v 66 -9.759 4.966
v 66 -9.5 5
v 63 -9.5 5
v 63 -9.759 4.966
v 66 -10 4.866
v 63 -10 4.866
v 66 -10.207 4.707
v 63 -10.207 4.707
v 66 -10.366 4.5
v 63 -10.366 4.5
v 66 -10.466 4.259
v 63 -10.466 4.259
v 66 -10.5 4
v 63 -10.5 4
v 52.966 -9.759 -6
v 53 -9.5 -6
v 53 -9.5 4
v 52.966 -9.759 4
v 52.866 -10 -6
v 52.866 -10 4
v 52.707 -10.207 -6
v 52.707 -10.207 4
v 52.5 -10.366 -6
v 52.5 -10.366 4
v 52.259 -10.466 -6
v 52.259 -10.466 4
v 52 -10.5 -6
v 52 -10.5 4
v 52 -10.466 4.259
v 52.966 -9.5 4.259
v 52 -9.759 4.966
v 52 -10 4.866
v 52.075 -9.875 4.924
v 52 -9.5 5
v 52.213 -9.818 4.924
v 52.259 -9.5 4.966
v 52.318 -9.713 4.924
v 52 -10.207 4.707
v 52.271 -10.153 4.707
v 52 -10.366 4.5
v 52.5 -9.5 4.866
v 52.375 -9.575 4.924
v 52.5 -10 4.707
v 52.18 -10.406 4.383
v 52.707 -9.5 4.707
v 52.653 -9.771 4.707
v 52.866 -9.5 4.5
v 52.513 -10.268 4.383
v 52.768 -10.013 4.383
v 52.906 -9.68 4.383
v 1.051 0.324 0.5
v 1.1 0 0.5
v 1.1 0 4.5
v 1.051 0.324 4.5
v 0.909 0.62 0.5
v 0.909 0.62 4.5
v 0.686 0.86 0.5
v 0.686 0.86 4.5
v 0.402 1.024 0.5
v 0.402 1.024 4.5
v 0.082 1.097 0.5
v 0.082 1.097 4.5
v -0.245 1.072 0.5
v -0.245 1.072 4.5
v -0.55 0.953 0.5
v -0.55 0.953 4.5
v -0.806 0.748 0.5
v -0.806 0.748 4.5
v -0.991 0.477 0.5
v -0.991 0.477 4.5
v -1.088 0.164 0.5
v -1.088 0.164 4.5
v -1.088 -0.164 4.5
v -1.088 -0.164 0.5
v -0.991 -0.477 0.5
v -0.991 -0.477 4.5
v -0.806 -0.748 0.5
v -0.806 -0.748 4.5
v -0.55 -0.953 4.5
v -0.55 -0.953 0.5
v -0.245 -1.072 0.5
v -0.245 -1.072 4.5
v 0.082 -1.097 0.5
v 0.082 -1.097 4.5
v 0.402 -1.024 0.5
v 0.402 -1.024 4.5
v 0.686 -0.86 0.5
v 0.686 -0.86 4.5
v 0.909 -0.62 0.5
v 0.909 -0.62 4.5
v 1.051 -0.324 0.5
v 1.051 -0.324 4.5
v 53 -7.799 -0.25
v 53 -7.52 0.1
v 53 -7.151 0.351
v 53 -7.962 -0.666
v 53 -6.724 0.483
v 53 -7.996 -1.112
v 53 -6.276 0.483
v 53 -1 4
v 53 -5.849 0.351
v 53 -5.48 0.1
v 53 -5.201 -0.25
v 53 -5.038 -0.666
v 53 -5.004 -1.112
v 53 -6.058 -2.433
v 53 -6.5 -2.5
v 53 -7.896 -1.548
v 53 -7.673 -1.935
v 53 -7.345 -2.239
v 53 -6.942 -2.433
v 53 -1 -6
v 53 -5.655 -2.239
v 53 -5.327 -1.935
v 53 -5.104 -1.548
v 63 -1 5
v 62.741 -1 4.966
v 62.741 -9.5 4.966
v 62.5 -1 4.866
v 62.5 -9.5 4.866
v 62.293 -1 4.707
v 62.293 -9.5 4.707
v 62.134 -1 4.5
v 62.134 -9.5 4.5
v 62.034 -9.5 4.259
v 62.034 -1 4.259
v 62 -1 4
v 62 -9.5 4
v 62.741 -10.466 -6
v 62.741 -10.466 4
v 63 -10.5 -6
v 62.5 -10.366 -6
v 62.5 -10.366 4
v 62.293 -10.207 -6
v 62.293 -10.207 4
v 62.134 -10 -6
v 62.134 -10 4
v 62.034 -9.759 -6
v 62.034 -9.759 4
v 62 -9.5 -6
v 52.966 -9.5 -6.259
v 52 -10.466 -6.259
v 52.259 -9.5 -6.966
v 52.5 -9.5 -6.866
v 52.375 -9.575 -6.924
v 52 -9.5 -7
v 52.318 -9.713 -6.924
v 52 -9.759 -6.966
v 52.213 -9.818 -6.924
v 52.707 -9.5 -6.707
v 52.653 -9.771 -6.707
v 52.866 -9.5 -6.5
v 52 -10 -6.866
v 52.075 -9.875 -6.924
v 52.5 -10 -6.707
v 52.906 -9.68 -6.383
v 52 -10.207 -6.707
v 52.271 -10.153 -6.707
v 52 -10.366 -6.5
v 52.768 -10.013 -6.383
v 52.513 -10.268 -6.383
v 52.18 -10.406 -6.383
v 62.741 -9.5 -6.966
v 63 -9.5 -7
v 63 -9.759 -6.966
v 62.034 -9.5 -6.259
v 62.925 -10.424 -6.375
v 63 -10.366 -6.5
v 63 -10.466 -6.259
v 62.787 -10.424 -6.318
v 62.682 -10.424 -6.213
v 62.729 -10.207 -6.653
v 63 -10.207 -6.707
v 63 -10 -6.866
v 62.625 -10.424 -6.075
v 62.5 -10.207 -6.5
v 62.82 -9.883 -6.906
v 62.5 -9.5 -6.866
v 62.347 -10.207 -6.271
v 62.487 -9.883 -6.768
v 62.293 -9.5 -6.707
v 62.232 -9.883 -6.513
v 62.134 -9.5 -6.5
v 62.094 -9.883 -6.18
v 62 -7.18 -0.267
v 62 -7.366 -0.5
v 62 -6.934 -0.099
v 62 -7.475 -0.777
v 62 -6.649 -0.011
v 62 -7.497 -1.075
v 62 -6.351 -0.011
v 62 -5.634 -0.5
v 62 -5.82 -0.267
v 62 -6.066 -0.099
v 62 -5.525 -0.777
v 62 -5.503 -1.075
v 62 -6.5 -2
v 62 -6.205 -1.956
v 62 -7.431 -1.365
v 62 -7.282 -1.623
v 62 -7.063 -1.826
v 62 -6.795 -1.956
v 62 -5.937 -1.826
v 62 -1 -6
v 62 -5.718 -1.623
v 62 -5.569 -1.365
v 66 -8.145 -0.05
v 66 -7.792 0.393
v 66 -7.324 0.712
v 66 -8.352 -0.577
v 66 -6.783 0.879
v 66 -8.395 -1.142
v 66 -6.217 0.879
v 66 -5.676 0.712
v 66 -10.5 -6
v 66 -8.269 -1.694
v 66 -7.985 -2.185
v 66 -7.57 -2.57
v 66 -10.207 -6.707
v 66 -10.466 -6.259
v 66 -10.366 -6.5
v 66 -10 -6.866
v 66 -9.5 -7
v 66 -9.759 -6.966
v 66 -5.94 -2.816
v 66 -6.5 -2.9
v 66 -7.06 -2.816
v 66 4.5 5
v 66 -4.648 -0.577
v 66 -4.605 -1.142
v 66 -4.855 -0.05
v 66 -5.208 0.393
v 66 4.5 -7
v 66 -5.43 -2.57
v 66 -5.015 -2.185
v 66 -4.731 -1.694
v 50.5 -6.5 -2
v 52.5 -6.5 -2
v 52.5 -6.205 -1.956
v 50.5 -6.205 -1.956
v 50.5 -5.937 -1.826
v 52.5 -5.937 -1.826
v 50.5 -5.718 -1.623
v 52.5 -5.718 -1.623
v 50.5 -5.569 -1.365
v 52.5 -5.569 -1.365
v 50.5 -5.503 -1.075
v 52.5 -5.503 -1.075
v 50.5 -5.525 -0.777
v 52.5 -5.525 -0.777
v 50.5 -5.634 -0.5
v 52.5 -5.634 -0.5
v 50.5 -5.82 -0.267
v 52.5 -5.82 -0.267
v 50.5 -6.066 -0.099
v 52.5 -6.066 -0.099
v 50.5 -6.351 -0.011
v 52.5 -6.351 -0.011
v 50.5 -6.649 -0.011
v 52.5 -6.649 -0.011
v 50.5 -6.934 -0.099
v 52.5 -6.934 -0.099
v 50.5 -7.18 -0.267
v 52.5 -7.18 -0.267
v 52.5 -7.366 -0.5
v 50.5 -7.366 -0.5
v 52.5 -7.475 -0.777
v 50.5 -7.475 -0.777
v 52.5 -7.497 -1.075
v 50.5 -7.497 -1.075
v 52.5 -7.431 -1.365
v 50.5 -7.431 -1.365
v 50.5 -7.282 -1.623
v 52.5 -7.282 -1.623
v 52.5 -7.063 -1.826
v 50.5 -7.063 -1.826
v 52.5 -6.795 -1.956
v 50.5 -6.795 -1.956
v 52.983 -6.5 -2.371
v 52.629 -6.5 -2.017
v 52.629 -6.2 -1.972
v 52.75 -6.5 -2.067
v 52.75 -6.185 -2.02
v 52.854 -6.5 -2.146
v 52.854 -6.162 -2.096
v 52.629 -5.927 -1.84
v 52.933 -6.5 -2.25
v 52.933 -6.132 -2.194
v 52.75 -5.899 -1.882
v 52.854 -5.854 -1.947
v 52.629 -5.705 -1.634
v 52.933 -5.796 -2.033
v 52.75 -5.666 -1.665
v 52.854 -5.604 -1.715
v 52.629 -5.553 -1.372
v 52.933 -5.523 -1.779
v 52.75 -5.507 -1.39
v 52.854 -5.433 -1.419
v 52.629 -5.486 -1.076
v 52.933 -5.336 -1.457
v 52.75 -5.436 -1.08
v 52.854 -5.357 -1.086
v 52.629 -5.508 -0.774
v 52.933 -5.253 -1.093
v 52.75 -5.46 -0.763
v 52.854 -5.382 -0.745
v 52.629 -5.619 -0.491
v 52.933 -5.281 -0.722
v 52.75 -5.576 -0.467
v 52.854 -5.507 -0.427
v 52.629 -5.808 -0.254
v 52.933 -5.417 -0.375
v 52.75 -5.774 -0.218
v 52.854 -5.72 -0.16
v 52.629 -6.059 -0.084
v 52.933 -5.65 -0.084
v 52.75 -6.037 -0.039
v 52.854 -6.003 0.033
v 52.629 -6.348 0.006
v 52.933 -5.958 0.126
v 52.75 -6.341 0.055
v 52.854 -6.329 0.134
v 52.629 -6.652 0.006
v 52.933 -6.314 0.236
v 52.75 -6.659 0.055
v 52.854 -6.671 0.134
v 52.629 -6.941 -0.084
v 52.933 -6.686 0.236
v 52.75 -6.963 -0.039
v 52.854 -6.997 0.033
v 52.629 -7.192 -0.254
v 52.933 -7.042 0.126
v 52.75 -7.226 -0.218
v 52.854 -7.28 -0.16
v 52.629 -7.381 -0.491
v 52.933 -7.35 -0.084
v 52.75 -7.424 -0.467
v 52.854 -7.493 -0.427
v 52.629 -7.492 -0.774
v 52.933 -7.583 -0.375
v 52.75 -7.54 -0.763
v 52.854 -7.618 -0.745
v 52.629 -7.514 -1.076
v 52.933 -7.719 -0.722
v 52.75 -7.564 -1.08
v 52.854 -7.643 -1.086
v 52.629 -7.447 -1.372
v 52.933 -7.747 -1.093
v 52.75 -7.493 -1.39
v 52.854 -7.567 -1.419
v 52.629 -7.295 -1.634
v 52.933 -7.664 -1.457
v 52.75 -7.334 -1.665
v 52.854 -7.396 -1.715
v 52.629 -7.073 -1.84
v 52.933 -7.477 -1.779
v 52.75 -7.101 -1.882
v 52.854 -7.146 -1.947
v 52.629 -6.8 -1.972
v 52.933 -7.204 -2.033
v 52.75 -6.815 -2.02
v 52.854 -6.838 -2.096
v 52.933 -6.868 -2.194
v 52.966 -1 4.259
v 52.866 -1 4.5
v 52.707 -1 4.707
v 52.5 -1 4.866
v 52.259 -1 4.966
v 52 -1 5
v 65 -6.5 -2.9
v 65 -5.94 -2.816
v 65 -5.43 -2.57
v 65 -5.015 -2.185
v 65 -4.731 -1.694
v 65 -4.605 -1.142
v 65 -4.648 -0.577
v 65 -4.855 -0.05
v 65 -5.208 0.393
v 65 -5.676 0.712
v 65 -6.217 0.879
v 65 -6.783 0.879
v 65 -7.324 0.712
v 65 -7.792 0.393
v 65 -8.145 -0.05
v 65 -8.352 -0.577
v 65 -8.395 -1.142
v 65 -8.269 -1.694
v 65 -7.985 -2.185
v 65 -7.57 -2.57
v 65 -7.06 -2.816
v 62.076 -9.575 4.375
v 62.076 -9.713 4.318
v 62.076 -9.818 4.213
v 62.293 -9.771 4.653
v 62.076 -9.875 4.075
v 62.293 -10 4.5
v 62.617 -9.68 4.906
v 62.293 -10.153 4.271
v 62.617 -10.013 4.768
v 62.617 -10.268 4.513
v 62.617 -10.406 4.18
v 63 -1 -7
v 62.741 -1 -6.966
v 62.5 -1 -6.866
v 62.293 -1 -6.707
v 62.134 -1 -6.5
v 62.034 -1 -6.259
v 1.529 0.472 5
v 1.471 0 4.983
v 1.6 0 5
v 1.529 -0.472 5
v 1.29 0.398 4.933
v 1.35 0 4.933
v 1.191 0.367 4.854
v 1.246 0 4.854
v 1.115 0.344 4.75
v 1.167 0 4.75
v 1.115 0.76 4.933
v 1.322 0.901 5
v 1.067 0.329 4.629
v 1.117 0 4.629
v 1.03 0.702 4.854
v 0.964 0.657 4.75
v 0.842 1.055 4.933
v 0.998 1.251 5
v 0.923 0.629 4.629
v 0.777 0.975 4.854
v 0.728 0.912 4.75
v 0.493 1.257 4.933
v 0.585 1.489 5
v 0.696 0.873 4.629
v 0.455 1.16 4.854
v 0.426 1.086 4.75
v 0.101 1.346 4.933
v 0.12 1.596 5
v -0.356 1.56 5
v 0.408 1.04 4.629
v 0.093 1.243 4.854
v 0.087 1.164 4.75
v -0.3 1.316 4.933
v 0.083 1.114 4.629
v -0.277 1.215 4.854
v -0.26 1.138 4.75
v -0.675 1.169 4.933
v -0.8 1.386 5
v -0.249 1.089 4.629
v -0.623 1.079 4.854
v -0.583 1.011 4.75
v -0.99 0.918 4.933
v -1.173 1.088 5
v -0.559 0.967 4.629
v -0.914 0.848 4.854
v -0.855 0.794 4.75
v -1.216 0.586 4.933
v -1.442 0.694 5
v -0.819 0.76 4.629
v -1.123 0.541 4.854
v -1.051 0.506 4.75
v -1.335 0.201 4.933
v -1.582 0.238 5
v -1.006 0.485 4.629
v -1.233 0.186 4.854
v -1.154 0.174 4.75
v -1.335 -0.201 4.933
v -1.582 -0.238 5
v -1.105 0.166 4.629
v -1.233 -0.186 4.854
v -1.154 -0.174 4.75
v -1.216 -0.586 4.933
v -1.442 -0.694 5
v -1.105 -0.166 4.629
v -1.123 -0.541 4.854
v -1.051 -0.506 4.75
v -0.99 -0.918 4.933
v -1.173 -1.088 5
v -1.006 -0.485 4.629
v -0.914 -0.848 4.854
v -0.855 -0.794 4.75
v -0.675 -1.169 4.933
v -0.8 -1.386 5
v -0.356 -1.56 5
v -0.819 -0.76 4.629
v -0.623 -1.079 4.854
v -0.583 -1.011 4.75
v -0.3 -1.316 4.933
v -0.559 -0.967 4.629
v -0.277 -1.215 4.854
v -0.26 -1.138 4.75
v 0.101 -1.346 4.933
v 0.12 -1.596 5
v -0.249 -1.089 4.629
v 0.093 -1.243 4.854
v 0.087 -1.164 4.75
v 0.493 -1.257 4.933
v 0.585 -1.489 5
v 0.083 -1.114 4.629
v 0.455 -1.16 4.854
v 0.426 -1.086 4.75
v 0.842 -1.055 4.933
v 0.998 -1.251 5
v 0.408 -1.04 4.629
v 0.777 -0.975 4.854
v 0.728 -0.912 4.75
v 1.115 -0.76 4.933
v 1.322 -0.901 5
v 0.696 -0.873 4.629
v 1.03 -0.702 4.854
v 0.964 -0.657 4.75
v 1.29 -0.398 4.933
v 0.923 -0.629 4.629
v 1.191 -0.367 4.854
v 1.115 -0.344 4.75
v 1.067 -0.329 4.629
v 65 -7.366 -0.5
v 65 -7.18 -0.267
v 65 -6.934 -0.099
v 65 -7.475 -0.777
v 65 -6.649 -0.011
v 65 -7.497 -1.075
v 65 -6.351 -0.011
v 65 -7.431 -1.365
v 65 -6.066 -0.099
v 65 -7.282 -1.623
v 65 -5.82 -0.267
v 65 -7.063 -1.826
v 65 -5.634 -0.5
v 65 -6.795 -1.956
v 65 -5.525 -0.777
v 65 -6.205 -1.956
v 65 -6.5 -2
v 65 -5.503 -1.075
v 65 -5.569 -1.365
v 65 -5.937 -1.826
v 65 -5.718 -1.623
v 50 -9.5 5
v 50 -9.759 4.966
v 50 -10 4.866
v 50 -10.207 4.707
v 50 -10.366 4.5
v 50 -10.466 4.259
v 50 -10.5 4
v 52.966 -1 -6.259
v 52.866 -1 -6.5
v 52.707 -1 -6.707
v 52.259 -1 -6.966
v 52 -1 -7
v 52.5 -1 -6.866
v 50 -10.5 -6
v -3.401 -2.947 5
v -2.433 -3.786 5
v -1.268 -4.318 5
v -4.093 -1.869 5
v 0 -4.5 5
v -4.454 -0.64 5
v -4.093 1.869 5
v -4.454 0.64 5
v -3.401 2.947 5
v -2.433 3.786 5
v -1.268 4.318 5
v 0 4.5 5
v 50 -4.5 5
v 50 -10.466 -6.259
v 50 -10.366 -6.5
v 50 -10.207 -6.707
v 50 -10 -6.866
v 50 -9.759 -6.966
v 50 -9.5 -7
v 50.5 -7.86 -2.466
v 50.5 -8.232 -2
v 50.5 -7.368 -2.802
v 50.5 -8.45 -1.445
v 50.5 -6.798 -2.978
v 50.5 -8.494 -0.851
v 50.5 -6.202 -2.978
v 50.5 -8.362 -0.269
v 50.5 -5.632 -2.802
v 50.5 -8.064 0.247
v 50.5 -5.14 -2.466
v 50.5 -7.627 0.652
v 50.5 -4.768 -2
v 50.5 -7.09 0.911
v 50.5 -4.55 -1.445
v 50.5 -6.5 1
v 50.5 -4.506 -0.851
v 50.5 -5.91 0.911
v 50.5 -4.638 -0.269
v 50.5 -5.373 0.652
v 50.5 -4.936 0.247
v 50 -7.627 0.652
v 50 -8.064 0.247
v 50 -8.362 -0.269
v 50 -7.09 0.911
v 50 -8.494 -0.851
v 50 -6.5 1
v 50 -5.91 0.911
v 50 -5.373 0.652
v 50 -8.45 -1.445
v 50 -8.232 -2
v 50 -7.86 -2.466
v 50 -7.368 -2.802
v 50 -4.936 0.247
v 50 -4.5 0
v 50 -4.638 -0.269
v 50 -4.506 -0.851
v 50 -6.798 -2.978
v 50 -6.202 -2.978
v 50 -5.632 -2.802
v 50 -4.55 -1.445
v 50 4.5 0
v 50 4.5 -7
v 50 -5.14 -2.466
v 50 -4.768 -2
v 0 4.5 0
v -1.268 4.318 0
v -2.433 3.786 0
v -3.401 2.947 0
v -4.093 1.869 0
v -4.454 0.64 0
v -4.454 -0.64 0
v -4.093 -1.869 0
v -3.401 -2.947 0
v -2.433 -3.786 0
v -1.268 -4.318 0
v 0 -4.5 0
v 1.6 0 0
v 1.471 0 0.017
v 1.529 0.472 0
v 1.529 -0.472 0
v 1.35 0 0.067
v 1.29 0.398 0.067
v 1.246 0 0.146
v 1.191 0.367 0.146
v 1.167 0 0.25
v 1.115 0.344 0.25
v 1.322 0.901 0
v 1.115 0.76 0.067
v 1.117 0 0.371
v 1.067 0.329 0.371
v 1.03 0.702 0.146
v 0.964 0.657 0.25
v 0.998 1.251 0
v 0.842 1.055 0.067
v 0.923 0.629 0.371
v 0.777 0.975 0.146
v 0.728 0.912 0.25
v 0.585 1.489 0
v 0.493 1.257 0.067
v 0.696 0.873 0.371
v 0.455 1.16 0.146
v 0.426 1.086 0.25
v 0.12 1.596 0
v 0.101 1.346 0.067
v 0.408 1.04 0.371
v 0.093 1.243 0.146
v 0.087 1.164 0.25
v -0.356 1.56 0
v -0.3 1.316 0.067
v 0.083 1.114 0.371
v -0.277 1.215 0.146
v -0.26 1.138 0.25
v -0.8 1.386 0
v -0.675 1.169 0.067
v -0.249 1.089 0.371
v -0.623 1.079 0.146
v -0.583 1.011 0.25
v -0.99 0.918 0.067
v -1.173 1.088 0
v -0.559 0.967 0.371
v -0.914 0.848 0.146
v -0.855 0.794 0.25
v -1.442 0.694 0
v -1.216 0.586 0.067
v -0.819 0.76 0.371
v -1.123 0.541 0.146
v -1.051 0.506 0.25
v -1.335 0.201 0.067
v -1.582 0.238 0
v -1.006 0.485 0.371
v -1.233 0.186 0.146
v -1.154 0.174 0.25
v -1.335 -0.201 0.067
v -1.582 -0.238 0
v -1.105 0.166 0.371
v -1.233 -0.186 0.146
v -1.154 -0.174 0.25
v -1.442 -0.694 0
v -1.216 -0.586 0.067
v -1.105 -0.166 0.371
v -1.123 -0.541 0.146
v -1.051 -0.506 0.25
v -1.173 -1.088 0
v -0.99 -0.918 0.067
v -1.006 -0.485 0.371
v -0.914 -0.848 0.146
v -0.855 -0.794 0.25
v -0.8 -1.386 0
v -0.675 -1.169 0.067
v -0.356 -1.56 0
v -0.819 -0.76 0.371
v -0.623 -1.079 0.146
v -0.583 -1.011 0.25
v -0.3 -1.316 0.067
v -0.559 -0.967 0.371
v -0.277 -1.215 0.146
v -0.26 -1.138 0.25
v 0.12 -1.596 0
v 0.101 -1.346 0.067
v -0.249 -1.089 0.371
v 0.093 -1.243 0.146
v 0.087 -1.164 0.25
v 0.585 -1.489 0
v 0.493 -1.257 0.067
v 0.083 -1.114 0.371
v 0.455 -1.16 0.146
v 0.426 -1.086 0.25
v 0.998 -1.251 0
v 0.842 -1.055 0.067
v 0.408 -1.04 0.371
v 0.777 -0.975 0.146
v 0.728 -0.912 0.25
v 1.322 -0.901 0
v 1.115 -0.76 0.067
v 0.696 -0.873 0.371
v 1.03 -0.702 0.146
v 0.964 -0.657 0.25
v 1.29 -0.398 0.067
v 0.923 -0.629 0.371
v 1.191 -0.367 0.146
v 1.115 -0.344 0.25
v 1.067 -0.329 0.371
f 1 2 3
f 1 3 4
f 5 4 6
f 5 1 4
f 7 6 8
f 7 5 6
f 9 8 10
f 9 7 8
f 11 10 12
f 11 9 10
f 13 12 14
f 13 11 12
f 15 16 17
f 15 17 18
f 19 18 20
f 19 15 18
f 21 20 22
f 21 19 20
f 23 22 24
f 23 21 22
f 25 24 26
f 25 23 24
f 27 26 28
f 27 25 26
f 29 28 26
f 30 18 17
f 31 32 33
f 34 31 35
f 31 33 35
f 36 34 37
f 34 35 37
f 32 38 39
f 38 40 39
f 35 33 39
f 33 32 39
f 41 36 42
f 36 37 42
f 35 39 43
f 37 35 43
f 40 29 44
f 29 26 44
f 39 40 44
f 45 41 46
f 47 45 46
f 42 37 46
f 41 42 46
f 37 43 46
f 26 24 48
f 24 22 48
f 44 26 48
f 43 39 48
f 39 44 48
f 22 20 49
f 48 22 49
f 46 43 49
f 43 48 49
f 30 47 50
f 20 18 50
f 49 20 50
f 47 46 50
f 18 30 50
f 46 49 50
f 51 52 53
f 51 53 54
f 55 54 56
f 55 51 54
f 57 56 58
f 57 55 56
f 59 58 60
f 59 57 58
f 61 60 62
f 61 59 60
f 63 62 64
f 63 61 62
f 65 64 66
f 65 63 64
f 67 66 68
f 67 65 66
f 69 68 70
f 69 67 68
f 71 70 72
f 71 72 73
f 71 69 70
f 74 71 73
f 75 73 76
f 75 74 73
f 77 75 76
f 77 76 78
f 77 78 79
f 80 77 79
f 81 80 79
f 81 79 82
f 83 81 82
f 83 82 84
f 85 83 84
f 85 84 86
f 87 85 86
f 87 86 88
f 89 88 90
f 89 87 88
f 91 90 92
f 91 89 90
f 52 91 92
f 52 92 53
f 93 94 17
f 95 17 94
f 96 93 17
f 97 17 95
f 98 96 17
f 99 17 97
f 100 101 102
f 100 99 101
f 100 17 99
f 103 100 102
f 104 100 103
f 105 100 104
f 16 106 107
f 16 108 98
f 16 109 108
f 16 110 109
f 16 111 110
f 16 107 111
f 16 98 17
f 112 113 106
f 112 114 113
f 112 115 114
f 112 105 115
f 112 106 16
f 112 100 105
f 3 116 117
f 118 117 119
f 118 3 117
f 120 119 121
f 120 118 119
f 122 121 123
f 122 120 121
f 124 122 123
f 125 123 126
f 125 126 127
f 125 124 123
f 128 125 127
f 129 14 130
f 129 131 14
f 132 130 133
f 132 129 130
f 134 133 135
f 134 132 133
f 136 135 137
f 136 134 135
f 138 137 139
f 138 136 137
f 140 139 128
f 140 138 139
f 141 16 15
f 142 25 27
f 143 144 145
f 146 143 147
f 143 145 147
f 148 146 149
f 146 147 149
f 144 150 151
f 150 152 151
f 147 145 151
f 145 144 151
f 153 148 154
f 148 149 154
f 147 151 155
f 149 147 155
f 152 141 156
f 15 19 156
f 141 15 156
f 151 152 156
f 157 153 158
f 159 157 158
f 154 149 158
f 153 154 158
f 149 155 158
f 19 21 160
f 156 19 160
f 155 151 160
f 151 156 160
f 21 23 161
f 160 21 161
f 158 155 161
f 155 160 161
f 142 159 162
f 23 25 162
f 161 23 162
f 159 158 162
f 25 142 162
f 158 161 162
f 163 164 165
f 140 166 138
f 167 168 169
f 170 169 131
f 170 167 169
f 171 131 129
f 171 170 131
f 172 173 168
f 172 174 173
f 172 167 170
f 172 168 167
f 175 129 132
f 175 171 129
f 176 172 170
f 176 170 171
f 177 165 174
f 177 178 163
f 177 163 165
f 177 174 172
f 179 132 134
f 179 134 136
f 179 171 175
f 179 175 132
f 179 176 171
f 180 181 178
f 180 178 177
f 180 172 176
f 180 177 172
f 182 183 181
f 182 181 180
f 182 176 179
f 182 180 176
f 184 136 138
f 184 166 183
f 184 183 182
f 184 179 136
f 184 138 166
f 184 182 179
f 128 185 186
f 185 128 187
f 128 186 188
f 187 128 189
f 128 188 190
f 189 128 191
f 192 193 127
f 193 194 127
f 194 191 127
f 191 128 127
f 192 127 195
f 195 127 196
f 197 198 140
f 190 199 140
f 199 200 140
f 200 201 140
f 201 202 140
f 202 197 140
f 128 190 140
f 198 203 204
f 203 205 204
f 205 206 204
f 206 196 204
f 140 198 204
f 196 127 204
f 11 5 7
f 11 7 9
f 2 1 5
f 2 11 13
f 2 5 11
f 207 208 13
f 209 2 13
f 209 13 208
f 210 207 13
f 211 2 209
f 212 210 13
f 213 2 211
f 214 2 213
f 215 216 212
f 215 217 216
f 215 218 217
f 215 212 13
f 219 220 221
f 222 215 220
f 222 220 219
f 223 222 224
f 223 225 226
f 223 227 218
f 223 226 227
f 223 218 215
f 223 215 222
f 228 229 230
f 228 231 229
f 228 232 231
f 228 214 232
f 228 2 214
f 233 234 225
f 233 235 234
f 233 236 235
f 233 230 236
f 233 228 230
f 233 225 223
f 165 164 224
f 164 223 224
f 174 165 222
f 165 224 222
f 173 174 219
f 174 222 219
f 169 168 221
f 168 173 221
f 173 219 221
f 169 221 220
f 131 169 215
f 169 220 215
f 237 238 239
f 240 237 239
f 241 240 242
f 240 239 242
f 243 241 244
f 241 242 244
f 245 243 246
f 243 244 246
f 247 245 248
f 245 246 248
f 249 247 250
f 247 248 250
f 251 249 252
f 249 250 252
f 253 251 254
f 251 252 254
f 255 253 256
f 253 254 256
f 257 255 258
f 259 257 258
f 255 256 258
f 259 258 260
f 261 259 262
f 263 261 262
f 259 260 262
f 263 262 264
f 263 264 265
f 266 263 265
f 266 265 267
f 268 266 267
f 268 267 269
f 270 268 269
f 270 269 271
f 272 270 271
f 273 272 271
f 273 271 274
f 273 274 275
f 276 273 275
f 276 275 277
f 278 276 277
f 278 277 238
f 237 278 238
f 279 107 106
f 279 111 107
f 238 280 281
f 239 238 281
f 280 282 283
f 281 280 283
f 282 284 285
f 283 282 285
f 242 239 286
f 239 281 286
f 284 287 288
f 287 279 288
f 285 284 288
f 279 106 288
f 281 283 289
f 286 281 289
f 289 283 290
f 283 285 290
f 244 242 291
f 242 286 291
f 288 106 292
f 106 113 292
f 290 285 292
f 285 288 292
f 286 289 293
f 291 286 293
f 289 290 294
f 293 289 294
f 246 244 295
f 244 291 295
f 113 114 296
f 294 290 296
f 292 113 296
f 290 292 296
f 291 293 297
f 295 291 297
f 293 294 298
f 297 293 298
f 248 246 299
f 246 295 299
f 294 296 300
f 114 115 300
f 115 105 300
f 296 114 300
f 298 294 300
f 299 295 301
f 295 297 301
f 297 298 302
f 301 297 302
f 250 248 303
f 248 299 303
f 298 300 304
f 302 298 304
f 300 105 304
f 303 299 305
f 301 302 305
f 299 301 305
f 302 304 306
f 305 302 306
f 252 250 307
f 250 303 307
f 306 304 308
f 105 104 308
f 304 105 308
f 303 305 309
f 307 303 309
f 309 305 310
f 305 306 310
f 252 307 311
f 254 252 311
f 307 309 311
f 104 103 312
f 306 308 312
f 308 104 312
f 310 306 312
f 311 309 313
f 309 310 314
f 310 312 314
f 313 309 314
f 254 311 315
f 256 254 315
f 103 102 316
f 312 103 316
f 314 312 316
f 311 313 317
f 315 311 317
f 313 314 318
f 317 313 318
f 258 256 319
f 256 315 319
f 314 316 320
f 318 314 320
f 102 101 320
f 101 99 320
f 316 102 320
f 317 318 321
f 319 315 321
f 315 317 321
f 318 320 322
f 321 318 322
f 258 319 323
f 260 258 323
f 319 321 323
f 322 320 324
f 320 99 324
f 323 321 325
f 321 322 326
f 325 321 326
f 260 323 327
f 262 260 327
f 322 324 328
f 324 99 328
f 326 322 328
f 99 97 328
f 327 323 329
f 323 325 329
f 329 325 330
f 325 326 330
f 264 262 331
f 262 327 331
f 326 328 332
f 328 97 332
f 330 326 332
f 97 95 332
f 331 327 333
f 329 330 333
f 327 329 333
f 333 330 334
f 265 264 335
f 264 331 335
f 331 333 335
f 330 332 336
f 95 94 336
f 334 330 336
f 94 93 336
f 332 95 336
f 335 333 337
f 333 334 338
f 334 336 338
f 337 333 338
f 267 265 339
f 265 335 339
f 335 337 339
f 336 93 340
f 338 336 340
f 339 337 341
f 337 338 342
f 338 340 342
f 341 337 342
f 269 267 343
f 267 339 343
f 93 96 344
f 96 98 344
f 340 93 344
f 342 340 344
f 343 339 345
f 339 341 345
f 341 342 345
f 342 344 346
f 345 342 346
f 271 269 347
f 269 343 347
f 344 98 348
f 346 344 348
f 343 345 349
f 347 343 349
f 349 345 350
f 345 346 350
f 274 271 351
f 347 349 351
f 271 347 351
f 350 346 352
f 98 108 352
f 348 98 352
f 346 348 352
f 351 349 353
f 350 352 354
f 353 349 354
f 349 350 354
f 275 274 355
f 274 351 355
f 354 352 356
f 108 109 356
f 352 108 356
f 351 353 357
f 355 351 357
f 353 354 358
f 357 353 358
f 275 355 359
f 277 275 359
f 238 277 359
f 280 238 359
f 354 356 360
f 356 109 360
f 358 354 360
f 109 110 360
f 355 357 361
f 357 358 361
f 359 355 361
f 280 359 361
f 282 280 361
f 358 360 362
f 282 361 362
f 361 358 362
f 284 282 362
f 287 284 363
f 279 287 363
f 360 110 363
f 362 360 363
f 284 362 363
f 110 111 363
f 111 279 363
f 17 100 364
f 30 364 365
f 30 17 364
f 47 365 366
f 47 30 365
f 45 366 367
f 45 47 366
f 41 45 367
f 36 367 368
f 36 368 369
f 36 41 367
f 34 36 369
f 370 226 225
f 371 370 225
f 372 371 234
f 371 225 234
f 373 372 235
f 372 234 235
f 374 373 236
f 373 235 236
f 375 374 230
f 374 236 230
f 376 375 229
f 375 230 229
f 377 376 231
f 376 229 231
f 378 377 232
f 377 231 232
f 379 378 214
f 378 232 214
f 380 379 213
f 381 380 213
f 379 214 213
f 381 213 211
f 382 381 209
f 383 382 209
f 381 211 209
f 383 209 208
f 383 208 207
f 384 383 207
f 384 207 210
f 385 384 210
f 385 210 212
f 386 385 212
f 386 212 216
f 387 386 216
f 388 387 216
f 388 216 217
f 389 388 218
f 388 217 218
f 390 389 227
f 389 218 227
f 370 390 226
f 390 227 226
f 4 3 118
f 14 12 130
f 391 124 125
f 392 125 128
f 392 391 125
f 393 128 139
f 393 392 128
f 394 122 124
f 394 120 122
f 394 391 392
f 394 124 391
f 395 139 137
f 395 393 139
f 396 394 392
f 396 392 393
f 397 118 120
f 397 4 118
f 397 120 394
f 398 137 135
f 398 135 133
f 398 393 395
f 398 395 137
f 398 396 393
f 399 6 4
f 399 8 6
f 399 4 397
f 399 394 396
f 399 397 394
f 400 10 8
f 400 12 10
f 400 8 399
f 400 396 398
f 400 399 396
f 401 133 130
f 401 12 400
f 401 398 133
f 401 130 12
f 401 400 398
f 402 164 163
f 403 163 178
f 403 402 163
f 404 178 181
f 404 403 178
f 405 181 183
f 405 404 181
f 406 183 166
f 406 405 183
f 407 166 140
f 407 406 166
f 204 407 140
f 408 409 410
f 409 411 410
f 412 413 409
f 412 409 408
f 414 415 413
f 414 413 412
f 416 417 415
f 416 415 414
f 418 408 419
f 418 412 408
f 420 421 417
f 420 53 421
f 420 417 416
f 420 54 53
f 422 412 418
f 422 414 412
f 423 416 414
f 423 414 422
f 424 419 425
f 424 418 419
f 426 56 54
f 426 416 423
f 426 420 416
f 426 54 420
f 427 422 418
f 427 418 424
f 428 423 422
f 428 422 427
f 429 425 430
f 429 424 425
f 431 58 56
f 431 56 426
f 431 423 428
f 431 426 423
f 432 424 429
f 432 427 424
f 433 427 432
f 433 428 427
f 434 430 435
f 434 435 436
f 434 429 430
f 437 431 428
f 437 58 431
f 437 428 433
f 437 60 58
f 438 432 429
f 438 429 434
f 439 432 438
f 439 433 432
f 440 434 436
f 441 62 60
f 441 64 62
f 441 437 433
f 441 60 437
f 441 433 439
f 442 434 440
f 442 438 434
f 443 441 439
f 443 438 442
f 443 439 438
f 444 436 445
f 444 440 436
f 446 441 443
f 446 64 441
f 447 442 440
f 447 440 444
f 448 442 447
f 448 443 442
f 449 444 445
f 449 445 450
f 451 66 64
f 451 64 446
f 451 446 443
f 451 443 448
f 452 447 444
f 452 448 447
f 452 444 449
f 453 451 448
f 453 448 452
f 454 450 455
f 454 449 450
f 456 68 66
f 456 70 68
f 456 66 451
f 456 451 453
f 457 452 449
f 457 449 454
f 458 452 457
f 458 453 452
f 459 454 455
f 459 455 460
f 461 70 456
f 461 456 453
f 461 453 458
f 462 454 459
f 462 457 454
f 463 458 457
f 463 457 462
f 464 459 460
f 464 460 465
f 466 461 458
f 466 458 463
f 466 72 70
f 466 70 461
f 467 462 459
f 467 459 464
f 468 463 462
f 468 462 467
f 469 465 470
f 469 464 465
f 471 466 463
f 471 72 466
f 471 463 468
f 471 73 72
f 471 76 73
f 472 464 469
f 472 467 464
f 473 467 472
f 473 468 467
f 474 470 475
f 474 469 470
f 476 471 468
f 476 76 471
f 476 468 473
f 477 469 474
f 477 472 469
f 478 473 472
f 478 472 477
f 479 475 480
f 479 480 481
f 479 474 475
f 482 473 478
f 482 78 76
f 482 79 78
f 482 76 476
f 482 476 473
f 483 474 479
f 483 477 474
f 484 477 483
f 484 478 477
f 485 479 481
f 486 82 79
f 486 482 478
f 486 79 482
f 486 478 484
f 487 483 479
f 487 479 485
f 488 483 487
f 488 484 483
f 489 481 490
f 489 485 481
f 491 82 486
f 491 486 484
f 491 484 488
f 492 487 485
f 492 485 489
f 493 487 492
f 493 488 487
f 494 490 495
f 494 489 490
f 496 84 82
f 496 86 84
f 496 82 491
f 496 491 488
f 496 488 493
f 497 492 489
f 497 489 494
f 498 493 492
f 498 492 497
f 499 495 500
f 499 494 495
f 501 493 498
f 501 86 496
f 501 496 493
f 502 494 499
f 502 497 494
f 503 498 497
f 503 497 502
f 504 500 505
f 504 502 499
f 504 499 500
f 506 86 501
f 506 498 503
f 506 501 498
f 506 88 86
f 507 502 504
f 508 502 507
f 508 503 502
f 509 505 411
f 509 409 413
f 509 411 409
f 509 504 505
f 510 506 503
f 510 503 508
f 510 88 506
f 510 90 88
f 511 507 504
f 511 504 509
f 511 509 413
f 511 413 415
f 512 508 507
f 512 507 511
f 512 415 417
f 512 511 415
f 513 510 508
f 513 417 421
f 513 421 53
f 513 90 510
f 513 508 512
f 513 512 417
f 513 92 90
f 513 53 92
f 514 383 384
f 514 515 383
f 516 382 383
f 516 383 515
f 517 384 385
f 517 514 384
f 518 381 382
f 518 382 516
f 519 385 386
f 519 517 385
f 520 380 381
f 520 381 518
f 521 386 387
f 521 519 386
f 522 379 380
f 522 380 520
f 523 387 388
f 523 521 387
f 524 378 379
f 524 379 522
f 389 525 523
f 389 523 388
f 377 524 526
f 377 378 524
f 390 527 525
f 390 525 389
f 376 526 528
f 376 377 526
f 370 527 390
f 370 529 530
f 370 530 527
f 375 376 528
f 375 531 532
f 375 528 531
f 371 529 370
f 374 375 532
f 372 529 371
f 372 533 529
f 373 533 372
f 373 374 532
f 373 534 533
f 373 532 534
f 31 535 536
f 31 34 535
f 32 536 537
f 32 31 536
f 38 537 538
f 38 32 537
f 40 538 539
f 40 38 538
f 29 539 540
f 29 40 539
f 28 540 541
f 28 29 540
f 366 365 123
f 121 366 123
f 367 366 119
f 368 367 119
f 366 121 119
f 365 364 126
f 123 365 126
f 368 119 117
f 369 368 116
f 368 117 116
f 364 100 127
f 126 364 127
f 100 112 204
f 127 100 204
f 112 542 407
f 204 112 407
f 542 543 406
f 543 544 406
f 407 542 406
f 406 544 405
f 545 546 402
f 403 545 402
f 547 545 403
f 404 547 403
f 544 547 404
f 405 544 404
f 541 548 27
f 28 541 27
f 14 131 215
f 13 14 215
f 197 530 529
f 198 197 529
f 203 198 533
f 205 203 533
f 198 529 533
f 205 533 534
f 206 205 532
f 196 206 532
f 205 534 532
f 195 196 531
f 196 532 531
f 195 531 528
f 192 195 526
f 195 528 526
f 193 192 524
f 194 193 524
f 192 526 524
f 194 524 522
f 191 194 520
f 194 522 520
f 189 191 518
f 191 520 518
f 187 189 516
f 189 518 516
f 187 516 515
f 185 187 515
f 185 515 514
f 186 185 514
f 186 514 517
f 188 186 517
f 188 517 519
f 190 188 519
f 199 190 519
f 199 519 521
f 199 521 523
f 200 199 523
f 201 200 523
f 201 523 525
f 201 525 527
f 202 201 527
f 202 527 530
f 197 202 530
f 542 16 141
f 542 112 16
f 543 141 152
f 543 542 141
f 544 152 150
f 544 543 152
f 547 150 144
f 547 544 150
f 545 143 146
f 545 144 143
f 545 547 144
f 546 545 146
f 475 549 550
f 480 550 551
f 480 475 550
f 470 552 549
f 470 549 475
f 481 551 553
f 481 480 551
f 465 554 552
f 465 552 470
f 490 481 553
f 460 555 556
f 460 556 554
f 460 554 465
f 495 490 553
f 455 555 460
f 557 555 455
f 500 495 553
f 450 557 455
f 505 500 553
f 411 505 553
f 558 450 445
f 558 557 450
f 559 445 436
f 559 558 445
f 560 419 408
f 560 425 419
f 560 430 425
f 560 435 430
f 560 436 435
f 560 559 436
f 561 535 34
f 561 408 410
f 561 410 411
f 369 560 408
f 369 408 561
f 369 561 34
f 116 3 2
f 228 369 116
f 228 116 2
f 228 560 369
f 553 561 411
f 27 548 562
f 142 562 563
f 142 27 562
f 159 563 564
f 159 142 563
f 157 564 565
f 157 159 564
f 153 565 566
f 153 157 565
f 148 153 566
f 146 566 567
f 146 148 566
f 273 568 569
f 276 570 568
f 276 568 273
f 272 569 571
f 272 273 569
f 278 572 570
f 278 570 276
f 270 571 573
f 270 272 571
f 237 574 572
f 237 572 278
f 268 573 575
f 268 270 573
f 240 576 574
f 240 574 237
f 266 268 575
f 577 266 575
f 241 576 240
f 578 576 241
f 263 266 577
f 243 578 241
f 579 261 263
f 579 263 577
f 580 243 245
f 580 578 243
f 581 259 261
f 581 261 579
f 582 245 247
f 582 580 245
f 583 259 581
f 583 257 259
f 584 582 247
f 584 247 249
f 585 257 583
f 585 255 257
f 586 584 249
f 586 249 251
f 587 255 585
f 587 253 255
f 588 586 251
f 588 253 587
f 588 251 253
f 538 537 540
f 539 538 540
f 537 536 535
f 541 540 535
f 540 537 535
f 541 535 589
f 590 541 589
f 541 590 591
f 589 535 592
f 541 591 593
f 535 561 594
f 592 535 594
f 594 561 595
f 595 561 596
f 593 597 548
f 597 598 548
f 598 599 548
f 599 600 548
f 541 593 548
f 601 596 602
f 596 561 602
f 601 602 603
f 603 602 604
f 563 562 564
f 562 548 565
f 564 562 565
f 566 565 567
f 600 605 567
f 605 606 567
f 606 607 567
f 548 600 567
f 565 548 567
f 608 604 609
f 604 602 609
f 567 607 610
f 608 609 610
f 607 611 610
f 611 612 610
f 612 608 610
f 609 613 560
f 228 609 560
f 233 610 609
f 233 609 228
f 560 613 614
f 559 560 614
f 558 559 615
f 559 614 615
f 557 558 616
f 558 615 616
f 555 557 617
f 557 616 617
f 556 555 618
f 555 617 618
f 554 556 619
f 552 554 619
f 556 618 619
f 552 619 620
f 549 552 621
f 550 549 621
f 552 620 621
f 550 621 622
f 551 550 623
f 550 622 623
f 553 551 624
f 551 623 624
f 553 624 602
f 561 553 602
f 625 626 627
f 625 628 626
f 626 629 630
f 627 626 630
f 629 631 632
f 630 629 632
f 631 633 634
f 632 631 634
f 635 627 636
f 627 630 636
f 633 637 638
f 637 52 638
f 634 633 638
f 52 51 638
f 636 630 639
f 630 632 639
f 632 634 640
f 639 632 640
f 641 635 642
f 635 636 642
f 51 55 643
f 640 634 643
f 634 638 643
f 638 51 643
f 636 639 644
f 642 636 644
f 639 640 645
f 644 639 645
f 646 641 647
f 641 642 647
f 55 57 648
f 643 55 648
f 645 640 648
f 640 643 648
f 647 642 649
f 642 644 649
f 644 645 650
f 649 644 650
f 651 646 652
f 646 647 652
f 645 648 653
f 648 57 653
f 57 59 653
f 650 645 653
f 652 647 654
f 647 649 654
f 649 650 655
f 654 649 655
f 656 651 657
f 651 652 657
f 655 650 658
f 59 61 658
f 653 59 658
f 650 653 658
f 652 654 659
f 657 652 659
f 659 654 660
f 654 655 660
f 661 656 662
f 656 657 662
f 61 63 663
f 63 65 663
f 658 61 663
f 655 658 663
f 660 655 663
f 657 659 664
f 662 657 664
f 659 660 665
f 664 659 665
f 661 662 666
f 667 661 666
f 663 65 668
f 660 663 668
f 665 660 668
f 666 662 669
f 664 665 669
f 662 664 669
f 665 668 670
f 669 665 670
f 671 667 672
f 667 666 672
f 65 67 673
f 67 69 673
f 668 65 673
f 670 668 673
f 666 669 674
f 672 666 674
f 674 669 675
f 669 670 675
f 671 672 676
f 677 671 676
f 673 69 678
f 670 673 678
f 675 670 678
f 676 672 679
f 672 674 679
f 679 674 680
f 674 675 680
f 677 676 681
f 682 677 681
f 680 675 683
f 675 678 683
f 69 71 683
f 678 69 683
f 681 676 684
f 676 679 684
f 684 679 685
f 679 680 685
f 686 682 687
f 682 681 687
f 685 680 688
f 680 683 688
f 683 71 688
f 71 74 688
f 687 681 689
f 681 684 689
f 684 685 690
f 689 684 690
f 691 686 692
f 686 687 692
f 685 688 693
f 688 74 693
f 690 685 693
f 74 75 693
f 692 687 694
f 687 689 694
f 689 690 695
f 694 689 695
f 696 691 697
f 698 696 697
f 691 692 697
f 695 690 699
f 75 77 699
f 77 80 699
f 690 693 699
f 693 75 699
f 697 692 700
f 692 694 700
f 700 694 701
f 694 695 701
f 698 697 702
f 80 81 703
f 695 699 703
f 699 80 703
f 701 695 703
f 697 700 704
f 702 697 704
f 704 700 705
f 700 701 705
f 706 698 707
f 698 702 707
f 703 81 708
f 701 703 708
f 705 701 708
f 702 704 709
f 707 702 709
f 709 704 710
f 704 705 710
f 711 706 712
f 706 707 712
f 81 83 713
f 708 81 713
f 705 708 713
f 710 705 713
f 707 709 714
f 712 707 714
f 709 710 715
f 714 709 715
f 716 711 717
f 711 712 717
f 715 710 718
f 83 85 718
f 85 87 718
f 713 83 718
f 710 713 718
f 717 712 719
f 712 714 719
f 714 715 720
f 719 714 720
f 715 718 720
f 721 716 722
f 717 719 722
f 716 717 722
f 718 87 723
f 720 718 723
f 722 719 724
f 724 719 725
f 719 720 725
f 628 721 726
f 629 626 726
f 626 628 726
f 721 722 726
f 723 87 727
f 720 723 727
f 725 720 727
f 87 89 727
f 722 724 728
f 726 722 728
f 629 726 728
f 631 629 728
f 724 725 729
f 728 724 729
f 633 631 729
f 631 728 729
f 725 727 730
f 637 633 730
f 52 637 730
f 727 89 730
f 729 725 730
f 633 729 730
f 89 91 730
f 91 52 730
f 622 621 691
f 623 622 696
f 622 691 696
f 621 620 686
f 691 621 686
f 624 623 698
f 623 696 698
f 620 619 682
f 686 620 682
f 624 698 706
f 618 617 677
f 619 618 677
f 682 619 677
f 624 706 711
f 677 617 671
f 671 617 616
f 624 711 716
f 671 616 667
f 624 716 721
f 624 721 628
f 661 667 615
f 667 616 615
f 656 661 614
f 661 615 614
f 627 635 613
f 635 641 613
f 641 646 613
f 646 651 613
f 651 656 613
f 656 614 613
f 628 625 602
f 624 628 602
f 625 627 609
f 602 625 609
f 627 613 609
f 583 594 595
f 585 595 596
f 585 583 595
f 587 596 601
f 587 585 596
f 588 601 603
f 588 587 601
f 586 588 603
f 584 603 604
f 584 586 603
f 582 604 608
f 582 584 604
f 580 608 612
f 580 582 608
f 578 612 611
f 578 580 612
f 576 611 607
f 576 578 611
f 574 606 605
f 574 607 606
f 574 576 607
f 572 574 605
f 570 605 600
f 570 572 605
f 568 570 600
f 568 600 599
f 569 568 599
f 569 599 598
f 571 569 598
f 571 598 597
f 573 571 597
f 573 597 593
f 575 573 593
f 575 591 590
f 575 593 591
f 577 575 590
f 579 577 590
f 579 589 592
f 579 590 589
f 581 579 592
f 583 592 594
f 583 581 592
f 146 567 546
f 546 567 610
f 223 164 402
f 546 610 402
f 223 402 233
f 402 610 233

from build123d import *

# Parameters (mm, degrees)
SKETCH1_R           = 1.1
BOSS_EXTRUDE1_DEPTH = 5
SKETCH2_W           = 16
SKETCH2_H           = 12
BOSS_EXTRUDE2_DEPTH = 15
CUT_EXTRUDE1_START  = -5.5
SKETCH3_W           = 9
SKETCH3_H           = 14
CUT_EXTRUDE1_DEPTH  = 9.5
SKETCH4_R           = 1
CUT_EXTRUDE2_DEPTH  = 16
FILLET2_R           = 0.5
SKETCH5_R           = 1.9
CUT_EXTRUDE3_DEPTH  = 1
FILLET3_R           = 1
CUT_EXTRUDE4_START  = -0.5
SKETCH6_R           = 2
CUT_EXTRUDE4_DEPTH  = 5.5
FILLET4_R           = 0.5


with BuildPart() as part:
    # Sketch1 → Boss-Extrude1 (new body)
    with BuildSketch(Plane.XY):
        with BuildLine():
            ThreePointArc((0, 4.5), (-4.5, 0), (0, -4.5))
            Line((0, -4.5), (50, -4.5))
            Line((50, -4.5), (50, 4.5))
            Line((50, 4.5), (0, 4.5))
        make_face()
        Circle(SKETCH1_R, mode=Mode.SUBTRACT)
    extrude(amount=BOSS_EXTRUDE1_DEPTH)

    # Sketch2 → Boss-Extrude2 (add)
    with BuildSketch(Plane(origin=(0, 4.5, 0), x_dir=(1, 0, 0), z_dir=(0, 1, 0))):
        with Locations((58, 1)):
            Rectangle(SKETCH2_W, SKETCH2_H)
    extrude(amount=-BOSS_EXTRUDE2_DEPTH)

    # Sketch3 → Cut-Extrude1 (cut)
    with BuildSketch(Plane(origin=(0, 4.5, 0), x_dir=(1, 0, 0), z_dir=(0, 1, 0)).offset(CUT_EXTRUDE1_START)):
        with Locations((57.5, 2)):
            Rectangle(SKETCH3_W, SKETCH3_H)
    extrude(amount=-CUT_EXTRUDE1_DEPTH, mode=Mode.SUBTRACT)

    # Sketch4 → Cut-Extrude2 (cut)
    with BuildSketch(Plane(origin=(66, 0, 0), x_dir=(0, 0, -1), z_dir=(1, 0, 0))):
        with Locations((1, -6.5)):
            Circle(SKETCH4_R)
    extrude(amount=-CUT_EXTRUDE2_DEPTH, mode=Mode.SUBTRACT)

    # Fillet2
    fillet2_edges = [part.edges().sort_by_distance(p)[0] for p in [
        (53, -6.5, 0),
    ]]
    fillet(fillet2_edges, radius=FILLET2_R)

    # Sketch5 → Cut-Extrude3 (cut)
    with BuildSketch(Plane(origin=(66, 0, 0), x_dir=(0, 0, -1), z_dir=(1, 0, 0))):
        with Locations((1, -6.5)):
            Circle(SKETCH5_R)
    extrude(amount=-CUT_EXTRUDE3_DEPTH, mode=Mode.SUBTRACT)

    # Fillet3
    fillet3_edges = [part.edges().sort_by_distance(p)[0] for p in [
        (53, -10.5, -1),
        (51.5, -10.5, 5),
        (53, -5.75, 5),
        (53, -5.75, -7),
        (51.5, -10.5, -7),
        (64, -10.5, 5),
        (62, -5.75, -7),
        (62, -5.75, 5),
        (64, -10.5, -7),
        (62, -10.5, -1),
    ]]
    fillet(fillet3_edges, radius=FILLET3_R)

    # Sketch6 → Cut-Extrude4 (cut)
    with BuildSketch(Plane.ZY.offset(-50).offset(CUT_EXTRUDE4_START)):
        with Locations((-1, -6.5)):
            Circle(SKETCH6_R)
    extrude(amount=CUT_EXTRUDE4_DEPTH, mode=Mode.SUBTRACT)

    # Fillet4
    fillet4_edges = [part.edges().sort_by_distance(p)[0] for p in [
        (-1.1, 0, 5),
        (-1.1, 0, 0),
    ]]
    fillet(fillet4_edges, radius=FILLET4_R)


solid = part.part
